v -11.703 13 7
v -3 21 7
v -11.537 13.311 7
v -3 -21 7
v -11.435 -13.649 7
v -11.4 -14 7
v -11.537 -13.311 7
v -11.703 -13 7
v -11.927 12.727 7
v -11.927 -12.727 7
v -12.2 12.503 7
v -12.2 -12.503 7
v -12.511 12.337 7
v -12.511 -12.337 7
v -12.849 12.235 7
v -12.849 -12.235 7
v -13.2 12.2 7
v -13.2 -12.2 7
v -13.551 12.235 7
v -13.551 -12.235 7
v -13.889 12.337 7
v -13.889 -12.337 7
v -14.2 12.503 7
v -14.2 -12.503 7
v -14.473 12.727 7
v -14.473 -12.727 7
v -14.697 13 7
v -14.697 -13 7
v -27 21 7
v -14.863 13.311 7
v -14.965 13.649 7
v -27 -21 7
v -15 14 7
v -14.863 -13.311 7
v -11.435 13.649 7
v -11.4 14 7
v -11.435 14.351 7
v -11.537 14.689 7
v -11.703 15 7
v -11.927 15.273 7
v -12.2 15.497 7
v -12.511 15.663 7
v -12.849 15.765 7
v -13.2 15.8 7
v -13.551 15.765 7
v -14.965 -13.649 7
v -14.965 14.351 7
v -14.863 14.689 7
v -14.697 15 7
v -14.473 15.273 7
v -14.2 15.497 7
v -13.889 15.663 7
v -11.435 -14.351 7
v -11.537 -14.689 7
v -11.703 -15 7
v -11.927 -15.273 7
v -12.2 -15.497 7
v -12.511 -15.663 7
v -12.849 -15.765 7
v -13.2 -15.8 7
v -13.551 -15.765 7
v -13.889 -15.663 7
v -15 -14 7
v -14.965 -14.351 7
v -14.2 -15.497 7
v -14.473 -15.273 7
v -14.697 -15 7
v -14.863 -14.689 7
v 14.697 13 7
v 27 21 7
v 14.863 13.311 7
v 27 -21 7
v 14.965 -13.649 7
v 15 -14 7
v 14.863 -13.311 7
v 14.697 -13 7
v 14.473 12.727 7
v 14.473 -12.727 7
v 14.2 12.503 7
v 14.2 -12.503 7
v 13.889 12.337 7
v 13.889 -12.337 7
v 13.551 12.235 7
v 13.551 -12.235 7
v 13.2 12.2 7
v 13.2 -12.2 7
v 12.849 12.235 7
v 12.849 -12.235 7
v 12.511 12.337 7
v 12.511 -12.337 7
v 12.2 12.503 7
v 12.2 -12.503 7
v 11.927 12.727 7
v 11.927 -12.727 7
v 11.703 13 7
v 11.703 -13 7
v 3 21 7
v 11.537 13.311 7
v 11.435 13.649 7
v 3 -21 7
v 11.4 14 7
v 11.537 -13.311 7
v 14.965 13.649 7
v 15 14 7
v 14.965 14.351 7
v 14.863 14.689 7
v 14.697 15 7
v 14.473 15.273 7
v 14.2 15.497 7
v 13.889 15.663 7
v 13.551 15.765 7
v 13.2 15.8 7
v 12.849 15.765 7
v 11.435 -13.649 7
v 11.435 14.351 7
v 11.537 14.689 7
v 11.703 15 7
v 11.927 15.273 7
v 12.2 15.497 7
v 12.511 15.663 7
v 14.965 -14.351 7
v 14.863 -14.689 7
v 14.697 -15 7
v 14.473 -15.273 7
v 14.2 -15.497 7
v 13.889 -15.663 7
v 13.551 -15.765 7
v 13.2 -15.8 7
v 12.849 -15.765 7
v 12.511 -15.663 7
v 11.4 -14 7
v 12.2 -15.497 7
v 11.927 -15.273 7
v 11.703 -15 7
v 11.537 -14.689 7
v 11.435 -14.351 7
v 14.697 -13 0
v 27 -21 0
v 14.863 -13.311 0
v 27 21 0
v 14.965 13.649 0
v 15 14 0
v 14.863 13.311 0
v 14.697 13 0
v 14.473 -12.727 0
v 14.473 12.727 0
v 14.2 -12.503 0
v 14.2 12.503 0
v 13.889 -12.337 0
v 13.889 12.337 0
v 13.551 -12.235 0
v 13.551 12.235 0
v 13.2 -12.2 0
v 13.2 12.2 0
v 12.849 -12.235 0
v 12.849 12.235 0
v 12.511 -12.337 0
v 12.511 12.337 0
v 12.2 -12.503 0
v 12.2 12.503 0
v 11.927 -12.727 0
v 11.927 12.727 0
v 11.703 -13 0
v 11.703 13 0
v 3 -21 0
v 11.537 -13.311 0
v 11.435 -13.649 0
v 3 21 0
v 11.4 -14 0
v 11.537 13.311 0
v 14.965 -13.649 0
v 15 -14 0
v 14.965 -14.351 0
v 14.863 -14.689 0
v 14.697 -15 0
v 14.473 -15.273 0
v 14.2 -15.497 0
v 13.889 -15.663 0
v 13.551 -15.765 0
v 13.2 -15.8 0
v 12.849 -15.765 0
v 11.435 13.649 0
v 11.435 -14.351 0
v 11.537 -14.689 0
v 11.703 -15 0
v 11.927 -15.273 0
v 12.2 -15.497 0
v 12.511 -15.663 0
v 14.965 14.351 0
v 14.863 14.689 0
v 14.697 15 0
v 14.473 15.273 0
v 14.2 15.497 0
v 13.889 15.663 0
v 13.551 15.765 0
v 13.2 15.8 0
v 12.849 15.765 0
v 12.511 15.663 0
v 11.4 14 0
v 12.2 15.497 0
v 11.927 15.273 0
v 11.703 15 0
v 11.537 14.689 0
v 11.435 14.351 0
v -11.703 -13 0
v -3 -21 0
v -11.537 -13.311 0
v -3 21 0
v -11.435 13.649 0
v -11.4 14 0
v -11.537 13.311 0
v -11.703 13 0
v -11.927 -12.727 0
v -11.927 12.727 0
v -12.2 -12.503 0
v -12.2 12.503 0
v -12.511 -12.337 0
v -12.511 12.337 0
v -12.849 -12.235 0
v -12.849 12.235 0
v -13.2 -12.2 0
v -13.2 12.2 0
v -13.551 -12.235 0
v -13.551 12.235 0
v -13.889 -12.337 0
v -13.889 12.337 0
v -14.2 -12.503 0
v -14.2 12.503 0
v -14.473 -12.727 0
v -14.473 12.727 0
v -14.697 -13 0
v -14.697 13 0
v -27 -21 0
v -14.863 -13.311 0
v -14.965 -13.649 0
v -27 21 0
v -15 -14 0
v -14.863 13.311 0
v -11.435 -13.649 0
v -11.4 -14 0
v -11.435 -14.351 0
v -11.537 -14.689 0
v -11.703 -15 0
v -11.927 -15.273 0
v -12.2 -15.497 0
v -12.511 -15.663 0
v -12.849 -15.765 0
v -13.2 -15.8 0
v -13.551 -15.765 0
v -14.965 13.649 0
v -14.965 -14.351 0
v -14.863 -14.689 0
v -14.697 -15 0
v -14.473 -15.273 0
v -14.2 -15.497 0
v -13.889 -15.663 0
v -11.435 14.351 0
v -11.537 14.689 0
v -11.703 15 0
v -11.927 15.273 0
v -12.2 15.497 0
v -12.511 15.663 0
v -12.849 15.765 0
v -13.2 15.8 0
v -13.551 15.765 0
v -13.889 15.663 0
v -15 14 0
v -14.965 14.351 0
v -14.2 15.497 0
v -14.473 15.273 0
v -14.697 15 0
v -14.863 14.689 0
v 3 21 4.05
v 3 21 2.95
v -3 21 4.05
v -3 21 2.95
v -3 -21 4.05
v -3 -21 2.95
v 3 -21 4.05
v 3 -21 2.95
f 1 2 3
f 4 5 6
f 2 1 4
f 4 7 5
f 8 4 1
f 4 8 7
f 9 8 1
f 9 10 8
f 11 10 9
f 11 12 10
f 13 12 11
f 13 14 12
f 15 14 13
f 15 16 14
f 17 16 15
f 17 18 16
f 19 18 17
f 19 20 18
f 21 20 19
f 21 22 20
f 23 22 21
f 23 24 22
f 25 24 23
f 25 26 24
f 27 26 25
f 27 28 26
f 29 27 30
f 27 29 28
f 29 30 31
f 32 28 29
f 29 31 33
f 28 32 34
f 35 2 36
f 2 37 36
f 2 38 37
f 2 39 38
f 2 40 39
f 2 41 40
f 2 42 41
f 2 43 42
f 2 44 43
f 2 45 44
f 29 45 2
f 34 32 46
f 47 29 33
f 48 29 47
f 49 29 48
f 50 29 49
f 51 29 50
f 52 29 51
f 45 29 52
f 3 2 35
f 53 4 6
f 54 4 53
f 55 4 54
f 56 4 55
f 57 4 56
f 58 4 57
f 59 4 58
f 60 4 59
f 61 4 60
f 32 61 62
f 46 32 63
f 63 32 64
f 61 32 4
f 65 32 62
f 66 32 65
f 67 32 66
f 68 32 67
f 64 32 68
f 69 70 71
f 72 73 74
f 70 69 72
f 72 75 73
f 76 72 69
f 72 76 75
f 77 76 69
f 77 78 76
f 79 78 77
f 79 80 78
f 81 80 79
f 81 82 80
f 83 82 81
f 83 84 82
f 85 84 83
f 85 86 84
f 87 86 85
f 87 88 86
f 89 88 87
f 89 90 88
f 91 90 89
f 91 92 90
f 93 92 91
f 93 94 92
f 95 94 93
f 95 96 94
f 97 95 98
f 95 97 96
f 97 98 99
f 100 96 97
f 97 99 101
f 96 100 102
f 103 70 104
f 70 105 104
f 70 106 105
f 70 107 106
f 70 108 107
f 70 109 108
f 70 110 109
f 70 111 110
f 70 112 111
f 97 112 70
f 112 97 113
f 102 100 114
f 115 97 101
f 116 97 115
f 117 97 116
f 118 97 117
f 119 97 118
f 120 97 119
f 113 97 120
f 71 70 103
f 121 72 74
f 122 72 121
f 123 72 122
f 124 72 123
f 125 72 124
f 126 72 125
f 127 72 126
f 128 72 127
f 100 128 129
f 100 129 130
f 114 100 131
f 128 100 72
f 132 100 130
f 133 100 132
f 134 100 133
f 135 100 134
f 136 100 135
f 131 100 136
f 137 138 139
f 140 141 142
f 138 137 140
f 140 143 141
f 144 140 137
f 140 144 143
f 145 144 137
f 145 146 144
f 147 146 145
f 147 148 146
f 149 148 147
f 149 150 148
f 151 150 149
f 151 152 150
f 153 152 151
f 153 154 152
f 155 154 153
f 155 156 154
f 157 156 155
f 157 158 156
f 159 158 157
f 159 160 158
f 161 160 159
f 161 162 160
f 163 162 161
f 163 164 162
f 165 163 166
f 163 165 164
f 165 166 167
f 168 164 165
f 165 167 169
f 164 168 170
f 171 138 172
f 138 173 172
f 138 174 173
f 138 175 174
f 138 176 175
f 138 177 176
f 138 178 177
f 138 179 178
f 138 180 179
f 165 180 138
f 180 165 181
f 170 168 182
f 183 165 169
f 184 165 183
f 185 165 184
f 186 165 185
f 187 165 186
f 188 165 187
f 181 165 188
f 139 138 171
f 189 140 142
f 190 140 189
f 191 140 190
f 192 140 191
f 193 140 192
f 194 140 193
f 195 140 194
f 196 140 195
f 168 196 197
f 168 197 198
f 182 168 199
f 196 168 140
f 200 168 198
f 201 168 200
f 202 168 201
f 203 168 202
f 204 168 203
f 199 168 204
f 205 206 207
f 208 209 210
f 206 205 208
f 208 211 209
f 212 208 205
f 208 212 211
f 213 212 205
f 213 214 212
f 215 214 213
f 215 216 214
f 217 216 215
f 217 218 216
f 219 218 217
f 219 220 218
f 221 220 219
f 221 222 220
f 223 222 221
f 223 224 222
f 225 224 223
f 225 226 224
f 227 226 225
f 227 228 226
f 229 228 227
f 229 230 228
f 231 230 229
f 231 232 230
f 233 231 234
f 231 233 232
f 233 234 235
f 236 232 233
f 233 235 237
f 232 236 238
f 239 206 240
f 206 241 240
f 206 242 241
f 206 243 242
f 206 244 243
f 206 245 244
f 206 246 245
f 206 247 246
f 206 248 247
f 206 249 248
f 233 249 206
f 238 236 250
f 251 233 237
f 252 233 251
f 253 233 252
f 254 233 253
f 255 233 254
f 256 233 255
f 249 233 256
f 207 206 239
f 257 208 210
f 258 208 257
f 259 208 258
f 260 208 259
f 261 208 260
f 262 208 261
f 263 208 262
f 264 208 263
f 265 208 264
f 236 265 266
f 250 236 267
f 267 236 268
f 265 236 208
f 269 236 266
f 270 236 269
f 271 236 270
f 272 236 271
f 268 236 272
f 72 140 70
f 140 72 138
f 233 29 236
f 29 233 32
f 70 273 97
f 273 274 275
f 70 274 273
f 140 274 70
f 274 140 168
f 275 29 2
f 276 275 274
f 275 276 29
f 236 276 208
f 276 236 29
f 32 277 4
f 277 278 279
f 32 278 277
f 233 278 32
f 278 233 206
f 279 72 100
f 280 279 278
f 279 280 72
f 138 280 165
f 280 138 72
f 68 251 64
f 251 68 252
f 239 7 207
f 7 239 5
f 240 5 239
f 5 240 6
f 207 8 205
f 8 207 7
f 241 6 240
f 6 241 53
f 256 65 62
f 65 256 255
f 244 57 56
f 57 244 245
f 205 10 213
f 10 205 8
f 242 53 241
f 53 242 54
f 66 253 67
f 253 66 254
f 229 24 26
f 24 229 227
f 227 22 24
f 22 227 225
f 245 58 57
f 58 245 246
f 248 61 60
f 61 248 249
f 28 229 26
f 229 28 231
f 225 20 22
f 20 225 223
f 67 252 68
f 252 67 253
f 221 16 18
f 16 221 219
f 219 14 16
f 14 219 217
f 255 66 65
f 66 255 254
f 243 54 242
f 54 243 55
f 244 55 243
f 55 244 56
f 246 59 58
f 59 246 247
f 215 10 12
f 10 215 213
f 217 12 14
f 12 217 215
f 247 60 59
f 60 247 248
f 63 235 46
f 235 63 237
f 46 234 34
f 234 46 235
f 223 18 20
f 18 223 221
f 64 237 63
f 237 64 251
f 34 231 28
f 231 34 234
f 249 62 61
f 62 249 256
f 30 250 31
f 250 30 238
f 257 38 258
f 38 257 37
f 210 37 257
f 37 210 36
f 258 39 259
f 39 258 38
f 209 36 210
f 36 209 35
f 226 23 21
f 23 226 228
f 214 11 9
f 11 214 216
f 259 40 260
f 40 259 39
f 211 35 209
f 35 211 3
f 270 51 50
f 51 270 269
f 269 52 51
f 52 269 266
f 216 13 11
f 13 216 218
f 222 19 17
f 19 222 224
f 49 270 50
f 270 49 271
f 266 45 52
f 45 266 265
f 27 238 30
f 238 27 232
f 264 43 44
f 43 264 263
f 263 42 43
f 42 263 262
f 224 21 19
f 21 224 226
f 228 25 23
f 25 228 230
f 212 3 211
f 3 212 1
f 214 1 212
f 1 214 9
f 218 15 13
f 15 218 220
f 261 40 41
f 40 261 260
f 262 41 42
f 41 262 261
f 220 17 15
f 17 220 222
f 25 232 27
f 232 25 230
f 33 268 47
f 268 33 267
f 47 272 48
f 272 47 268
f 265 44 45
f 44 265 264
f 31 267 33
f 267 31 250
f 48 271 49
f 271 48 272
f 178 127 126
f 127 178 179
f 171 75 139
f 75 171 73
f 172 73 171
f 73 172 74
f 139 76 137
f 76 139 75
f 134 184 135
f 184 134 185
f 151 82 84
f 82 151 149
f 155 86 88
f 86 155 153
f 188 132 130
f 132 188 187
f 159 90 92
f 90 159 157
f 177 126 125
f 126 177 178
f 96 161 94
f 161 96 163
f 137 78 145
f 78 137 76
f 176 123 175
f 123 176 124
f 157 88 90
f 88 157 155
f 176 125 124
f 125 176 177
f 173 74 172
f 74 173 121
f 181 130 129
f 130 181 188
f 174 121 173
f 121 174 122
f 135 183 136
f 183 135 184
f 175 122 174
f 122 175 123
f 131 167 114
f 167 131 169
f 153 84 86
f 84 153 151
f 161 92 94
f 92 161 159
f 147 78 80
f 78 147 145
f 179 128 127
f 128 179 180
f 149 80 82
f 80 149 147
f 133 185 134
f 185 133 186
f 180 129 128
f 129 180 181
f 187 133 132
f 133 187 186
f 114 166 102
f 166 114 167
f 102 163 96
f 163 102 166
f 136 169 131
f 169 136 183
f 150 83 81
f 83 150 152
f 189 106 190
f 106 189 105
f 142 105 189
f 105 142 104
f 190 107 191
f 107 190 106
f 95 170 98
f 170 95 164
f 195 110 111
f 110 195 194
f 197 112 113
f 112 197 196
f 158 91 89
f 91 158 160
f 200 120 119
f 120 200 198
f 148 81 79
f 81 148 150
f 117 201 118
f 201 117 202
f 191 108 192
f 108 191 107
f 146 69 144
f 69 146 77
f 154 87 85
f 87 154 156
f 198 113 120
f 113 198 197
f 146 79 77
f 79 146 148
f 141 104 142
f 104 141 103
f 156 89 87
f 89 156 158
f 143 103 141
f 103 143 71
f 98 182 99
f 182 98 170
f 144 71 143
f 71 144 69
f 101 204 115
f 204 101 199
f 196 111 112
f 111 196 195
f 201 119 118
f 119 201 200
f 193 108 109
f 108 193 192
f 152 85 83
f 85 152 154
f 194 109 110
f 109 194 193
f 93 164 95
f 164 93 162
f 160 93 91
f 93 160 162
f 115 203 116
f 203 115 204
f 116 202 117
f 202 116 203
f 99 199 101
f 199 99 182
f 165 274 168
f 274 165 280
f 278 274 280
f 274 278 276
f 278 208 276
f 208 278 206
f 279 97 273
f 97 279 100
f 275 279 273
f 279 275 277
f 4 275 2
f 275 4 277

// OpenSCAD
$fn = 32;

// ----------------------------------------------------------------------
// Living hinge: 54 x 42 mm plates, 1.1 mm flexible web
// ----------------------------------------------------------------------

// --- parameters (mm) ---
plate_len = 24;           // plate length outside the web
plate_w = 42;             // plate width
thick = 7;                // plate thickness
web_half = 3;             // half width of the flex band
web_t = 1.1;              // flexible web thickness
web_z = 2.95;             // web position inside the thickness
boss_d = 10;              // screw boss diameter
boss_h = 7;               // screw boss height
boss_x = 13.2;            // screw boss distance from the web
screw_d = 3.6;            // screw hole

difference() {
  union() {
    /* one flat strip, later thinned at the middle */
    translate([-27, -21, 0]) cube([54, 42, 7]);
    /* screw bosses, sunk 0.5 mm into the plates */
    for (sx = [-13.2, 13.2]) {
      for (sy = [-14, 14]) {
        translate([sx, sy, 0]) cylinder(h = boss_h, d = boss_d);
      }
    }
  }
  /* channel from below: leaves the web on top of it */
  translate([-3, -23.5, -2.5]) cube([6, 47, 5.45]);
  /* channel from above: thins the web down to web_t */
  translate([-3, -23.5, 4.05]) cube([6, 47, 5.45]);
  /* screw holes through the bosses */
  for (sx = [-13.2, 13.2]) {
    for (sy = [-14, 14]) {
      translate([sx, sy, -2.5]) cylinder(h = boss_h + 5, d = screw_d);
    }
  }
}
